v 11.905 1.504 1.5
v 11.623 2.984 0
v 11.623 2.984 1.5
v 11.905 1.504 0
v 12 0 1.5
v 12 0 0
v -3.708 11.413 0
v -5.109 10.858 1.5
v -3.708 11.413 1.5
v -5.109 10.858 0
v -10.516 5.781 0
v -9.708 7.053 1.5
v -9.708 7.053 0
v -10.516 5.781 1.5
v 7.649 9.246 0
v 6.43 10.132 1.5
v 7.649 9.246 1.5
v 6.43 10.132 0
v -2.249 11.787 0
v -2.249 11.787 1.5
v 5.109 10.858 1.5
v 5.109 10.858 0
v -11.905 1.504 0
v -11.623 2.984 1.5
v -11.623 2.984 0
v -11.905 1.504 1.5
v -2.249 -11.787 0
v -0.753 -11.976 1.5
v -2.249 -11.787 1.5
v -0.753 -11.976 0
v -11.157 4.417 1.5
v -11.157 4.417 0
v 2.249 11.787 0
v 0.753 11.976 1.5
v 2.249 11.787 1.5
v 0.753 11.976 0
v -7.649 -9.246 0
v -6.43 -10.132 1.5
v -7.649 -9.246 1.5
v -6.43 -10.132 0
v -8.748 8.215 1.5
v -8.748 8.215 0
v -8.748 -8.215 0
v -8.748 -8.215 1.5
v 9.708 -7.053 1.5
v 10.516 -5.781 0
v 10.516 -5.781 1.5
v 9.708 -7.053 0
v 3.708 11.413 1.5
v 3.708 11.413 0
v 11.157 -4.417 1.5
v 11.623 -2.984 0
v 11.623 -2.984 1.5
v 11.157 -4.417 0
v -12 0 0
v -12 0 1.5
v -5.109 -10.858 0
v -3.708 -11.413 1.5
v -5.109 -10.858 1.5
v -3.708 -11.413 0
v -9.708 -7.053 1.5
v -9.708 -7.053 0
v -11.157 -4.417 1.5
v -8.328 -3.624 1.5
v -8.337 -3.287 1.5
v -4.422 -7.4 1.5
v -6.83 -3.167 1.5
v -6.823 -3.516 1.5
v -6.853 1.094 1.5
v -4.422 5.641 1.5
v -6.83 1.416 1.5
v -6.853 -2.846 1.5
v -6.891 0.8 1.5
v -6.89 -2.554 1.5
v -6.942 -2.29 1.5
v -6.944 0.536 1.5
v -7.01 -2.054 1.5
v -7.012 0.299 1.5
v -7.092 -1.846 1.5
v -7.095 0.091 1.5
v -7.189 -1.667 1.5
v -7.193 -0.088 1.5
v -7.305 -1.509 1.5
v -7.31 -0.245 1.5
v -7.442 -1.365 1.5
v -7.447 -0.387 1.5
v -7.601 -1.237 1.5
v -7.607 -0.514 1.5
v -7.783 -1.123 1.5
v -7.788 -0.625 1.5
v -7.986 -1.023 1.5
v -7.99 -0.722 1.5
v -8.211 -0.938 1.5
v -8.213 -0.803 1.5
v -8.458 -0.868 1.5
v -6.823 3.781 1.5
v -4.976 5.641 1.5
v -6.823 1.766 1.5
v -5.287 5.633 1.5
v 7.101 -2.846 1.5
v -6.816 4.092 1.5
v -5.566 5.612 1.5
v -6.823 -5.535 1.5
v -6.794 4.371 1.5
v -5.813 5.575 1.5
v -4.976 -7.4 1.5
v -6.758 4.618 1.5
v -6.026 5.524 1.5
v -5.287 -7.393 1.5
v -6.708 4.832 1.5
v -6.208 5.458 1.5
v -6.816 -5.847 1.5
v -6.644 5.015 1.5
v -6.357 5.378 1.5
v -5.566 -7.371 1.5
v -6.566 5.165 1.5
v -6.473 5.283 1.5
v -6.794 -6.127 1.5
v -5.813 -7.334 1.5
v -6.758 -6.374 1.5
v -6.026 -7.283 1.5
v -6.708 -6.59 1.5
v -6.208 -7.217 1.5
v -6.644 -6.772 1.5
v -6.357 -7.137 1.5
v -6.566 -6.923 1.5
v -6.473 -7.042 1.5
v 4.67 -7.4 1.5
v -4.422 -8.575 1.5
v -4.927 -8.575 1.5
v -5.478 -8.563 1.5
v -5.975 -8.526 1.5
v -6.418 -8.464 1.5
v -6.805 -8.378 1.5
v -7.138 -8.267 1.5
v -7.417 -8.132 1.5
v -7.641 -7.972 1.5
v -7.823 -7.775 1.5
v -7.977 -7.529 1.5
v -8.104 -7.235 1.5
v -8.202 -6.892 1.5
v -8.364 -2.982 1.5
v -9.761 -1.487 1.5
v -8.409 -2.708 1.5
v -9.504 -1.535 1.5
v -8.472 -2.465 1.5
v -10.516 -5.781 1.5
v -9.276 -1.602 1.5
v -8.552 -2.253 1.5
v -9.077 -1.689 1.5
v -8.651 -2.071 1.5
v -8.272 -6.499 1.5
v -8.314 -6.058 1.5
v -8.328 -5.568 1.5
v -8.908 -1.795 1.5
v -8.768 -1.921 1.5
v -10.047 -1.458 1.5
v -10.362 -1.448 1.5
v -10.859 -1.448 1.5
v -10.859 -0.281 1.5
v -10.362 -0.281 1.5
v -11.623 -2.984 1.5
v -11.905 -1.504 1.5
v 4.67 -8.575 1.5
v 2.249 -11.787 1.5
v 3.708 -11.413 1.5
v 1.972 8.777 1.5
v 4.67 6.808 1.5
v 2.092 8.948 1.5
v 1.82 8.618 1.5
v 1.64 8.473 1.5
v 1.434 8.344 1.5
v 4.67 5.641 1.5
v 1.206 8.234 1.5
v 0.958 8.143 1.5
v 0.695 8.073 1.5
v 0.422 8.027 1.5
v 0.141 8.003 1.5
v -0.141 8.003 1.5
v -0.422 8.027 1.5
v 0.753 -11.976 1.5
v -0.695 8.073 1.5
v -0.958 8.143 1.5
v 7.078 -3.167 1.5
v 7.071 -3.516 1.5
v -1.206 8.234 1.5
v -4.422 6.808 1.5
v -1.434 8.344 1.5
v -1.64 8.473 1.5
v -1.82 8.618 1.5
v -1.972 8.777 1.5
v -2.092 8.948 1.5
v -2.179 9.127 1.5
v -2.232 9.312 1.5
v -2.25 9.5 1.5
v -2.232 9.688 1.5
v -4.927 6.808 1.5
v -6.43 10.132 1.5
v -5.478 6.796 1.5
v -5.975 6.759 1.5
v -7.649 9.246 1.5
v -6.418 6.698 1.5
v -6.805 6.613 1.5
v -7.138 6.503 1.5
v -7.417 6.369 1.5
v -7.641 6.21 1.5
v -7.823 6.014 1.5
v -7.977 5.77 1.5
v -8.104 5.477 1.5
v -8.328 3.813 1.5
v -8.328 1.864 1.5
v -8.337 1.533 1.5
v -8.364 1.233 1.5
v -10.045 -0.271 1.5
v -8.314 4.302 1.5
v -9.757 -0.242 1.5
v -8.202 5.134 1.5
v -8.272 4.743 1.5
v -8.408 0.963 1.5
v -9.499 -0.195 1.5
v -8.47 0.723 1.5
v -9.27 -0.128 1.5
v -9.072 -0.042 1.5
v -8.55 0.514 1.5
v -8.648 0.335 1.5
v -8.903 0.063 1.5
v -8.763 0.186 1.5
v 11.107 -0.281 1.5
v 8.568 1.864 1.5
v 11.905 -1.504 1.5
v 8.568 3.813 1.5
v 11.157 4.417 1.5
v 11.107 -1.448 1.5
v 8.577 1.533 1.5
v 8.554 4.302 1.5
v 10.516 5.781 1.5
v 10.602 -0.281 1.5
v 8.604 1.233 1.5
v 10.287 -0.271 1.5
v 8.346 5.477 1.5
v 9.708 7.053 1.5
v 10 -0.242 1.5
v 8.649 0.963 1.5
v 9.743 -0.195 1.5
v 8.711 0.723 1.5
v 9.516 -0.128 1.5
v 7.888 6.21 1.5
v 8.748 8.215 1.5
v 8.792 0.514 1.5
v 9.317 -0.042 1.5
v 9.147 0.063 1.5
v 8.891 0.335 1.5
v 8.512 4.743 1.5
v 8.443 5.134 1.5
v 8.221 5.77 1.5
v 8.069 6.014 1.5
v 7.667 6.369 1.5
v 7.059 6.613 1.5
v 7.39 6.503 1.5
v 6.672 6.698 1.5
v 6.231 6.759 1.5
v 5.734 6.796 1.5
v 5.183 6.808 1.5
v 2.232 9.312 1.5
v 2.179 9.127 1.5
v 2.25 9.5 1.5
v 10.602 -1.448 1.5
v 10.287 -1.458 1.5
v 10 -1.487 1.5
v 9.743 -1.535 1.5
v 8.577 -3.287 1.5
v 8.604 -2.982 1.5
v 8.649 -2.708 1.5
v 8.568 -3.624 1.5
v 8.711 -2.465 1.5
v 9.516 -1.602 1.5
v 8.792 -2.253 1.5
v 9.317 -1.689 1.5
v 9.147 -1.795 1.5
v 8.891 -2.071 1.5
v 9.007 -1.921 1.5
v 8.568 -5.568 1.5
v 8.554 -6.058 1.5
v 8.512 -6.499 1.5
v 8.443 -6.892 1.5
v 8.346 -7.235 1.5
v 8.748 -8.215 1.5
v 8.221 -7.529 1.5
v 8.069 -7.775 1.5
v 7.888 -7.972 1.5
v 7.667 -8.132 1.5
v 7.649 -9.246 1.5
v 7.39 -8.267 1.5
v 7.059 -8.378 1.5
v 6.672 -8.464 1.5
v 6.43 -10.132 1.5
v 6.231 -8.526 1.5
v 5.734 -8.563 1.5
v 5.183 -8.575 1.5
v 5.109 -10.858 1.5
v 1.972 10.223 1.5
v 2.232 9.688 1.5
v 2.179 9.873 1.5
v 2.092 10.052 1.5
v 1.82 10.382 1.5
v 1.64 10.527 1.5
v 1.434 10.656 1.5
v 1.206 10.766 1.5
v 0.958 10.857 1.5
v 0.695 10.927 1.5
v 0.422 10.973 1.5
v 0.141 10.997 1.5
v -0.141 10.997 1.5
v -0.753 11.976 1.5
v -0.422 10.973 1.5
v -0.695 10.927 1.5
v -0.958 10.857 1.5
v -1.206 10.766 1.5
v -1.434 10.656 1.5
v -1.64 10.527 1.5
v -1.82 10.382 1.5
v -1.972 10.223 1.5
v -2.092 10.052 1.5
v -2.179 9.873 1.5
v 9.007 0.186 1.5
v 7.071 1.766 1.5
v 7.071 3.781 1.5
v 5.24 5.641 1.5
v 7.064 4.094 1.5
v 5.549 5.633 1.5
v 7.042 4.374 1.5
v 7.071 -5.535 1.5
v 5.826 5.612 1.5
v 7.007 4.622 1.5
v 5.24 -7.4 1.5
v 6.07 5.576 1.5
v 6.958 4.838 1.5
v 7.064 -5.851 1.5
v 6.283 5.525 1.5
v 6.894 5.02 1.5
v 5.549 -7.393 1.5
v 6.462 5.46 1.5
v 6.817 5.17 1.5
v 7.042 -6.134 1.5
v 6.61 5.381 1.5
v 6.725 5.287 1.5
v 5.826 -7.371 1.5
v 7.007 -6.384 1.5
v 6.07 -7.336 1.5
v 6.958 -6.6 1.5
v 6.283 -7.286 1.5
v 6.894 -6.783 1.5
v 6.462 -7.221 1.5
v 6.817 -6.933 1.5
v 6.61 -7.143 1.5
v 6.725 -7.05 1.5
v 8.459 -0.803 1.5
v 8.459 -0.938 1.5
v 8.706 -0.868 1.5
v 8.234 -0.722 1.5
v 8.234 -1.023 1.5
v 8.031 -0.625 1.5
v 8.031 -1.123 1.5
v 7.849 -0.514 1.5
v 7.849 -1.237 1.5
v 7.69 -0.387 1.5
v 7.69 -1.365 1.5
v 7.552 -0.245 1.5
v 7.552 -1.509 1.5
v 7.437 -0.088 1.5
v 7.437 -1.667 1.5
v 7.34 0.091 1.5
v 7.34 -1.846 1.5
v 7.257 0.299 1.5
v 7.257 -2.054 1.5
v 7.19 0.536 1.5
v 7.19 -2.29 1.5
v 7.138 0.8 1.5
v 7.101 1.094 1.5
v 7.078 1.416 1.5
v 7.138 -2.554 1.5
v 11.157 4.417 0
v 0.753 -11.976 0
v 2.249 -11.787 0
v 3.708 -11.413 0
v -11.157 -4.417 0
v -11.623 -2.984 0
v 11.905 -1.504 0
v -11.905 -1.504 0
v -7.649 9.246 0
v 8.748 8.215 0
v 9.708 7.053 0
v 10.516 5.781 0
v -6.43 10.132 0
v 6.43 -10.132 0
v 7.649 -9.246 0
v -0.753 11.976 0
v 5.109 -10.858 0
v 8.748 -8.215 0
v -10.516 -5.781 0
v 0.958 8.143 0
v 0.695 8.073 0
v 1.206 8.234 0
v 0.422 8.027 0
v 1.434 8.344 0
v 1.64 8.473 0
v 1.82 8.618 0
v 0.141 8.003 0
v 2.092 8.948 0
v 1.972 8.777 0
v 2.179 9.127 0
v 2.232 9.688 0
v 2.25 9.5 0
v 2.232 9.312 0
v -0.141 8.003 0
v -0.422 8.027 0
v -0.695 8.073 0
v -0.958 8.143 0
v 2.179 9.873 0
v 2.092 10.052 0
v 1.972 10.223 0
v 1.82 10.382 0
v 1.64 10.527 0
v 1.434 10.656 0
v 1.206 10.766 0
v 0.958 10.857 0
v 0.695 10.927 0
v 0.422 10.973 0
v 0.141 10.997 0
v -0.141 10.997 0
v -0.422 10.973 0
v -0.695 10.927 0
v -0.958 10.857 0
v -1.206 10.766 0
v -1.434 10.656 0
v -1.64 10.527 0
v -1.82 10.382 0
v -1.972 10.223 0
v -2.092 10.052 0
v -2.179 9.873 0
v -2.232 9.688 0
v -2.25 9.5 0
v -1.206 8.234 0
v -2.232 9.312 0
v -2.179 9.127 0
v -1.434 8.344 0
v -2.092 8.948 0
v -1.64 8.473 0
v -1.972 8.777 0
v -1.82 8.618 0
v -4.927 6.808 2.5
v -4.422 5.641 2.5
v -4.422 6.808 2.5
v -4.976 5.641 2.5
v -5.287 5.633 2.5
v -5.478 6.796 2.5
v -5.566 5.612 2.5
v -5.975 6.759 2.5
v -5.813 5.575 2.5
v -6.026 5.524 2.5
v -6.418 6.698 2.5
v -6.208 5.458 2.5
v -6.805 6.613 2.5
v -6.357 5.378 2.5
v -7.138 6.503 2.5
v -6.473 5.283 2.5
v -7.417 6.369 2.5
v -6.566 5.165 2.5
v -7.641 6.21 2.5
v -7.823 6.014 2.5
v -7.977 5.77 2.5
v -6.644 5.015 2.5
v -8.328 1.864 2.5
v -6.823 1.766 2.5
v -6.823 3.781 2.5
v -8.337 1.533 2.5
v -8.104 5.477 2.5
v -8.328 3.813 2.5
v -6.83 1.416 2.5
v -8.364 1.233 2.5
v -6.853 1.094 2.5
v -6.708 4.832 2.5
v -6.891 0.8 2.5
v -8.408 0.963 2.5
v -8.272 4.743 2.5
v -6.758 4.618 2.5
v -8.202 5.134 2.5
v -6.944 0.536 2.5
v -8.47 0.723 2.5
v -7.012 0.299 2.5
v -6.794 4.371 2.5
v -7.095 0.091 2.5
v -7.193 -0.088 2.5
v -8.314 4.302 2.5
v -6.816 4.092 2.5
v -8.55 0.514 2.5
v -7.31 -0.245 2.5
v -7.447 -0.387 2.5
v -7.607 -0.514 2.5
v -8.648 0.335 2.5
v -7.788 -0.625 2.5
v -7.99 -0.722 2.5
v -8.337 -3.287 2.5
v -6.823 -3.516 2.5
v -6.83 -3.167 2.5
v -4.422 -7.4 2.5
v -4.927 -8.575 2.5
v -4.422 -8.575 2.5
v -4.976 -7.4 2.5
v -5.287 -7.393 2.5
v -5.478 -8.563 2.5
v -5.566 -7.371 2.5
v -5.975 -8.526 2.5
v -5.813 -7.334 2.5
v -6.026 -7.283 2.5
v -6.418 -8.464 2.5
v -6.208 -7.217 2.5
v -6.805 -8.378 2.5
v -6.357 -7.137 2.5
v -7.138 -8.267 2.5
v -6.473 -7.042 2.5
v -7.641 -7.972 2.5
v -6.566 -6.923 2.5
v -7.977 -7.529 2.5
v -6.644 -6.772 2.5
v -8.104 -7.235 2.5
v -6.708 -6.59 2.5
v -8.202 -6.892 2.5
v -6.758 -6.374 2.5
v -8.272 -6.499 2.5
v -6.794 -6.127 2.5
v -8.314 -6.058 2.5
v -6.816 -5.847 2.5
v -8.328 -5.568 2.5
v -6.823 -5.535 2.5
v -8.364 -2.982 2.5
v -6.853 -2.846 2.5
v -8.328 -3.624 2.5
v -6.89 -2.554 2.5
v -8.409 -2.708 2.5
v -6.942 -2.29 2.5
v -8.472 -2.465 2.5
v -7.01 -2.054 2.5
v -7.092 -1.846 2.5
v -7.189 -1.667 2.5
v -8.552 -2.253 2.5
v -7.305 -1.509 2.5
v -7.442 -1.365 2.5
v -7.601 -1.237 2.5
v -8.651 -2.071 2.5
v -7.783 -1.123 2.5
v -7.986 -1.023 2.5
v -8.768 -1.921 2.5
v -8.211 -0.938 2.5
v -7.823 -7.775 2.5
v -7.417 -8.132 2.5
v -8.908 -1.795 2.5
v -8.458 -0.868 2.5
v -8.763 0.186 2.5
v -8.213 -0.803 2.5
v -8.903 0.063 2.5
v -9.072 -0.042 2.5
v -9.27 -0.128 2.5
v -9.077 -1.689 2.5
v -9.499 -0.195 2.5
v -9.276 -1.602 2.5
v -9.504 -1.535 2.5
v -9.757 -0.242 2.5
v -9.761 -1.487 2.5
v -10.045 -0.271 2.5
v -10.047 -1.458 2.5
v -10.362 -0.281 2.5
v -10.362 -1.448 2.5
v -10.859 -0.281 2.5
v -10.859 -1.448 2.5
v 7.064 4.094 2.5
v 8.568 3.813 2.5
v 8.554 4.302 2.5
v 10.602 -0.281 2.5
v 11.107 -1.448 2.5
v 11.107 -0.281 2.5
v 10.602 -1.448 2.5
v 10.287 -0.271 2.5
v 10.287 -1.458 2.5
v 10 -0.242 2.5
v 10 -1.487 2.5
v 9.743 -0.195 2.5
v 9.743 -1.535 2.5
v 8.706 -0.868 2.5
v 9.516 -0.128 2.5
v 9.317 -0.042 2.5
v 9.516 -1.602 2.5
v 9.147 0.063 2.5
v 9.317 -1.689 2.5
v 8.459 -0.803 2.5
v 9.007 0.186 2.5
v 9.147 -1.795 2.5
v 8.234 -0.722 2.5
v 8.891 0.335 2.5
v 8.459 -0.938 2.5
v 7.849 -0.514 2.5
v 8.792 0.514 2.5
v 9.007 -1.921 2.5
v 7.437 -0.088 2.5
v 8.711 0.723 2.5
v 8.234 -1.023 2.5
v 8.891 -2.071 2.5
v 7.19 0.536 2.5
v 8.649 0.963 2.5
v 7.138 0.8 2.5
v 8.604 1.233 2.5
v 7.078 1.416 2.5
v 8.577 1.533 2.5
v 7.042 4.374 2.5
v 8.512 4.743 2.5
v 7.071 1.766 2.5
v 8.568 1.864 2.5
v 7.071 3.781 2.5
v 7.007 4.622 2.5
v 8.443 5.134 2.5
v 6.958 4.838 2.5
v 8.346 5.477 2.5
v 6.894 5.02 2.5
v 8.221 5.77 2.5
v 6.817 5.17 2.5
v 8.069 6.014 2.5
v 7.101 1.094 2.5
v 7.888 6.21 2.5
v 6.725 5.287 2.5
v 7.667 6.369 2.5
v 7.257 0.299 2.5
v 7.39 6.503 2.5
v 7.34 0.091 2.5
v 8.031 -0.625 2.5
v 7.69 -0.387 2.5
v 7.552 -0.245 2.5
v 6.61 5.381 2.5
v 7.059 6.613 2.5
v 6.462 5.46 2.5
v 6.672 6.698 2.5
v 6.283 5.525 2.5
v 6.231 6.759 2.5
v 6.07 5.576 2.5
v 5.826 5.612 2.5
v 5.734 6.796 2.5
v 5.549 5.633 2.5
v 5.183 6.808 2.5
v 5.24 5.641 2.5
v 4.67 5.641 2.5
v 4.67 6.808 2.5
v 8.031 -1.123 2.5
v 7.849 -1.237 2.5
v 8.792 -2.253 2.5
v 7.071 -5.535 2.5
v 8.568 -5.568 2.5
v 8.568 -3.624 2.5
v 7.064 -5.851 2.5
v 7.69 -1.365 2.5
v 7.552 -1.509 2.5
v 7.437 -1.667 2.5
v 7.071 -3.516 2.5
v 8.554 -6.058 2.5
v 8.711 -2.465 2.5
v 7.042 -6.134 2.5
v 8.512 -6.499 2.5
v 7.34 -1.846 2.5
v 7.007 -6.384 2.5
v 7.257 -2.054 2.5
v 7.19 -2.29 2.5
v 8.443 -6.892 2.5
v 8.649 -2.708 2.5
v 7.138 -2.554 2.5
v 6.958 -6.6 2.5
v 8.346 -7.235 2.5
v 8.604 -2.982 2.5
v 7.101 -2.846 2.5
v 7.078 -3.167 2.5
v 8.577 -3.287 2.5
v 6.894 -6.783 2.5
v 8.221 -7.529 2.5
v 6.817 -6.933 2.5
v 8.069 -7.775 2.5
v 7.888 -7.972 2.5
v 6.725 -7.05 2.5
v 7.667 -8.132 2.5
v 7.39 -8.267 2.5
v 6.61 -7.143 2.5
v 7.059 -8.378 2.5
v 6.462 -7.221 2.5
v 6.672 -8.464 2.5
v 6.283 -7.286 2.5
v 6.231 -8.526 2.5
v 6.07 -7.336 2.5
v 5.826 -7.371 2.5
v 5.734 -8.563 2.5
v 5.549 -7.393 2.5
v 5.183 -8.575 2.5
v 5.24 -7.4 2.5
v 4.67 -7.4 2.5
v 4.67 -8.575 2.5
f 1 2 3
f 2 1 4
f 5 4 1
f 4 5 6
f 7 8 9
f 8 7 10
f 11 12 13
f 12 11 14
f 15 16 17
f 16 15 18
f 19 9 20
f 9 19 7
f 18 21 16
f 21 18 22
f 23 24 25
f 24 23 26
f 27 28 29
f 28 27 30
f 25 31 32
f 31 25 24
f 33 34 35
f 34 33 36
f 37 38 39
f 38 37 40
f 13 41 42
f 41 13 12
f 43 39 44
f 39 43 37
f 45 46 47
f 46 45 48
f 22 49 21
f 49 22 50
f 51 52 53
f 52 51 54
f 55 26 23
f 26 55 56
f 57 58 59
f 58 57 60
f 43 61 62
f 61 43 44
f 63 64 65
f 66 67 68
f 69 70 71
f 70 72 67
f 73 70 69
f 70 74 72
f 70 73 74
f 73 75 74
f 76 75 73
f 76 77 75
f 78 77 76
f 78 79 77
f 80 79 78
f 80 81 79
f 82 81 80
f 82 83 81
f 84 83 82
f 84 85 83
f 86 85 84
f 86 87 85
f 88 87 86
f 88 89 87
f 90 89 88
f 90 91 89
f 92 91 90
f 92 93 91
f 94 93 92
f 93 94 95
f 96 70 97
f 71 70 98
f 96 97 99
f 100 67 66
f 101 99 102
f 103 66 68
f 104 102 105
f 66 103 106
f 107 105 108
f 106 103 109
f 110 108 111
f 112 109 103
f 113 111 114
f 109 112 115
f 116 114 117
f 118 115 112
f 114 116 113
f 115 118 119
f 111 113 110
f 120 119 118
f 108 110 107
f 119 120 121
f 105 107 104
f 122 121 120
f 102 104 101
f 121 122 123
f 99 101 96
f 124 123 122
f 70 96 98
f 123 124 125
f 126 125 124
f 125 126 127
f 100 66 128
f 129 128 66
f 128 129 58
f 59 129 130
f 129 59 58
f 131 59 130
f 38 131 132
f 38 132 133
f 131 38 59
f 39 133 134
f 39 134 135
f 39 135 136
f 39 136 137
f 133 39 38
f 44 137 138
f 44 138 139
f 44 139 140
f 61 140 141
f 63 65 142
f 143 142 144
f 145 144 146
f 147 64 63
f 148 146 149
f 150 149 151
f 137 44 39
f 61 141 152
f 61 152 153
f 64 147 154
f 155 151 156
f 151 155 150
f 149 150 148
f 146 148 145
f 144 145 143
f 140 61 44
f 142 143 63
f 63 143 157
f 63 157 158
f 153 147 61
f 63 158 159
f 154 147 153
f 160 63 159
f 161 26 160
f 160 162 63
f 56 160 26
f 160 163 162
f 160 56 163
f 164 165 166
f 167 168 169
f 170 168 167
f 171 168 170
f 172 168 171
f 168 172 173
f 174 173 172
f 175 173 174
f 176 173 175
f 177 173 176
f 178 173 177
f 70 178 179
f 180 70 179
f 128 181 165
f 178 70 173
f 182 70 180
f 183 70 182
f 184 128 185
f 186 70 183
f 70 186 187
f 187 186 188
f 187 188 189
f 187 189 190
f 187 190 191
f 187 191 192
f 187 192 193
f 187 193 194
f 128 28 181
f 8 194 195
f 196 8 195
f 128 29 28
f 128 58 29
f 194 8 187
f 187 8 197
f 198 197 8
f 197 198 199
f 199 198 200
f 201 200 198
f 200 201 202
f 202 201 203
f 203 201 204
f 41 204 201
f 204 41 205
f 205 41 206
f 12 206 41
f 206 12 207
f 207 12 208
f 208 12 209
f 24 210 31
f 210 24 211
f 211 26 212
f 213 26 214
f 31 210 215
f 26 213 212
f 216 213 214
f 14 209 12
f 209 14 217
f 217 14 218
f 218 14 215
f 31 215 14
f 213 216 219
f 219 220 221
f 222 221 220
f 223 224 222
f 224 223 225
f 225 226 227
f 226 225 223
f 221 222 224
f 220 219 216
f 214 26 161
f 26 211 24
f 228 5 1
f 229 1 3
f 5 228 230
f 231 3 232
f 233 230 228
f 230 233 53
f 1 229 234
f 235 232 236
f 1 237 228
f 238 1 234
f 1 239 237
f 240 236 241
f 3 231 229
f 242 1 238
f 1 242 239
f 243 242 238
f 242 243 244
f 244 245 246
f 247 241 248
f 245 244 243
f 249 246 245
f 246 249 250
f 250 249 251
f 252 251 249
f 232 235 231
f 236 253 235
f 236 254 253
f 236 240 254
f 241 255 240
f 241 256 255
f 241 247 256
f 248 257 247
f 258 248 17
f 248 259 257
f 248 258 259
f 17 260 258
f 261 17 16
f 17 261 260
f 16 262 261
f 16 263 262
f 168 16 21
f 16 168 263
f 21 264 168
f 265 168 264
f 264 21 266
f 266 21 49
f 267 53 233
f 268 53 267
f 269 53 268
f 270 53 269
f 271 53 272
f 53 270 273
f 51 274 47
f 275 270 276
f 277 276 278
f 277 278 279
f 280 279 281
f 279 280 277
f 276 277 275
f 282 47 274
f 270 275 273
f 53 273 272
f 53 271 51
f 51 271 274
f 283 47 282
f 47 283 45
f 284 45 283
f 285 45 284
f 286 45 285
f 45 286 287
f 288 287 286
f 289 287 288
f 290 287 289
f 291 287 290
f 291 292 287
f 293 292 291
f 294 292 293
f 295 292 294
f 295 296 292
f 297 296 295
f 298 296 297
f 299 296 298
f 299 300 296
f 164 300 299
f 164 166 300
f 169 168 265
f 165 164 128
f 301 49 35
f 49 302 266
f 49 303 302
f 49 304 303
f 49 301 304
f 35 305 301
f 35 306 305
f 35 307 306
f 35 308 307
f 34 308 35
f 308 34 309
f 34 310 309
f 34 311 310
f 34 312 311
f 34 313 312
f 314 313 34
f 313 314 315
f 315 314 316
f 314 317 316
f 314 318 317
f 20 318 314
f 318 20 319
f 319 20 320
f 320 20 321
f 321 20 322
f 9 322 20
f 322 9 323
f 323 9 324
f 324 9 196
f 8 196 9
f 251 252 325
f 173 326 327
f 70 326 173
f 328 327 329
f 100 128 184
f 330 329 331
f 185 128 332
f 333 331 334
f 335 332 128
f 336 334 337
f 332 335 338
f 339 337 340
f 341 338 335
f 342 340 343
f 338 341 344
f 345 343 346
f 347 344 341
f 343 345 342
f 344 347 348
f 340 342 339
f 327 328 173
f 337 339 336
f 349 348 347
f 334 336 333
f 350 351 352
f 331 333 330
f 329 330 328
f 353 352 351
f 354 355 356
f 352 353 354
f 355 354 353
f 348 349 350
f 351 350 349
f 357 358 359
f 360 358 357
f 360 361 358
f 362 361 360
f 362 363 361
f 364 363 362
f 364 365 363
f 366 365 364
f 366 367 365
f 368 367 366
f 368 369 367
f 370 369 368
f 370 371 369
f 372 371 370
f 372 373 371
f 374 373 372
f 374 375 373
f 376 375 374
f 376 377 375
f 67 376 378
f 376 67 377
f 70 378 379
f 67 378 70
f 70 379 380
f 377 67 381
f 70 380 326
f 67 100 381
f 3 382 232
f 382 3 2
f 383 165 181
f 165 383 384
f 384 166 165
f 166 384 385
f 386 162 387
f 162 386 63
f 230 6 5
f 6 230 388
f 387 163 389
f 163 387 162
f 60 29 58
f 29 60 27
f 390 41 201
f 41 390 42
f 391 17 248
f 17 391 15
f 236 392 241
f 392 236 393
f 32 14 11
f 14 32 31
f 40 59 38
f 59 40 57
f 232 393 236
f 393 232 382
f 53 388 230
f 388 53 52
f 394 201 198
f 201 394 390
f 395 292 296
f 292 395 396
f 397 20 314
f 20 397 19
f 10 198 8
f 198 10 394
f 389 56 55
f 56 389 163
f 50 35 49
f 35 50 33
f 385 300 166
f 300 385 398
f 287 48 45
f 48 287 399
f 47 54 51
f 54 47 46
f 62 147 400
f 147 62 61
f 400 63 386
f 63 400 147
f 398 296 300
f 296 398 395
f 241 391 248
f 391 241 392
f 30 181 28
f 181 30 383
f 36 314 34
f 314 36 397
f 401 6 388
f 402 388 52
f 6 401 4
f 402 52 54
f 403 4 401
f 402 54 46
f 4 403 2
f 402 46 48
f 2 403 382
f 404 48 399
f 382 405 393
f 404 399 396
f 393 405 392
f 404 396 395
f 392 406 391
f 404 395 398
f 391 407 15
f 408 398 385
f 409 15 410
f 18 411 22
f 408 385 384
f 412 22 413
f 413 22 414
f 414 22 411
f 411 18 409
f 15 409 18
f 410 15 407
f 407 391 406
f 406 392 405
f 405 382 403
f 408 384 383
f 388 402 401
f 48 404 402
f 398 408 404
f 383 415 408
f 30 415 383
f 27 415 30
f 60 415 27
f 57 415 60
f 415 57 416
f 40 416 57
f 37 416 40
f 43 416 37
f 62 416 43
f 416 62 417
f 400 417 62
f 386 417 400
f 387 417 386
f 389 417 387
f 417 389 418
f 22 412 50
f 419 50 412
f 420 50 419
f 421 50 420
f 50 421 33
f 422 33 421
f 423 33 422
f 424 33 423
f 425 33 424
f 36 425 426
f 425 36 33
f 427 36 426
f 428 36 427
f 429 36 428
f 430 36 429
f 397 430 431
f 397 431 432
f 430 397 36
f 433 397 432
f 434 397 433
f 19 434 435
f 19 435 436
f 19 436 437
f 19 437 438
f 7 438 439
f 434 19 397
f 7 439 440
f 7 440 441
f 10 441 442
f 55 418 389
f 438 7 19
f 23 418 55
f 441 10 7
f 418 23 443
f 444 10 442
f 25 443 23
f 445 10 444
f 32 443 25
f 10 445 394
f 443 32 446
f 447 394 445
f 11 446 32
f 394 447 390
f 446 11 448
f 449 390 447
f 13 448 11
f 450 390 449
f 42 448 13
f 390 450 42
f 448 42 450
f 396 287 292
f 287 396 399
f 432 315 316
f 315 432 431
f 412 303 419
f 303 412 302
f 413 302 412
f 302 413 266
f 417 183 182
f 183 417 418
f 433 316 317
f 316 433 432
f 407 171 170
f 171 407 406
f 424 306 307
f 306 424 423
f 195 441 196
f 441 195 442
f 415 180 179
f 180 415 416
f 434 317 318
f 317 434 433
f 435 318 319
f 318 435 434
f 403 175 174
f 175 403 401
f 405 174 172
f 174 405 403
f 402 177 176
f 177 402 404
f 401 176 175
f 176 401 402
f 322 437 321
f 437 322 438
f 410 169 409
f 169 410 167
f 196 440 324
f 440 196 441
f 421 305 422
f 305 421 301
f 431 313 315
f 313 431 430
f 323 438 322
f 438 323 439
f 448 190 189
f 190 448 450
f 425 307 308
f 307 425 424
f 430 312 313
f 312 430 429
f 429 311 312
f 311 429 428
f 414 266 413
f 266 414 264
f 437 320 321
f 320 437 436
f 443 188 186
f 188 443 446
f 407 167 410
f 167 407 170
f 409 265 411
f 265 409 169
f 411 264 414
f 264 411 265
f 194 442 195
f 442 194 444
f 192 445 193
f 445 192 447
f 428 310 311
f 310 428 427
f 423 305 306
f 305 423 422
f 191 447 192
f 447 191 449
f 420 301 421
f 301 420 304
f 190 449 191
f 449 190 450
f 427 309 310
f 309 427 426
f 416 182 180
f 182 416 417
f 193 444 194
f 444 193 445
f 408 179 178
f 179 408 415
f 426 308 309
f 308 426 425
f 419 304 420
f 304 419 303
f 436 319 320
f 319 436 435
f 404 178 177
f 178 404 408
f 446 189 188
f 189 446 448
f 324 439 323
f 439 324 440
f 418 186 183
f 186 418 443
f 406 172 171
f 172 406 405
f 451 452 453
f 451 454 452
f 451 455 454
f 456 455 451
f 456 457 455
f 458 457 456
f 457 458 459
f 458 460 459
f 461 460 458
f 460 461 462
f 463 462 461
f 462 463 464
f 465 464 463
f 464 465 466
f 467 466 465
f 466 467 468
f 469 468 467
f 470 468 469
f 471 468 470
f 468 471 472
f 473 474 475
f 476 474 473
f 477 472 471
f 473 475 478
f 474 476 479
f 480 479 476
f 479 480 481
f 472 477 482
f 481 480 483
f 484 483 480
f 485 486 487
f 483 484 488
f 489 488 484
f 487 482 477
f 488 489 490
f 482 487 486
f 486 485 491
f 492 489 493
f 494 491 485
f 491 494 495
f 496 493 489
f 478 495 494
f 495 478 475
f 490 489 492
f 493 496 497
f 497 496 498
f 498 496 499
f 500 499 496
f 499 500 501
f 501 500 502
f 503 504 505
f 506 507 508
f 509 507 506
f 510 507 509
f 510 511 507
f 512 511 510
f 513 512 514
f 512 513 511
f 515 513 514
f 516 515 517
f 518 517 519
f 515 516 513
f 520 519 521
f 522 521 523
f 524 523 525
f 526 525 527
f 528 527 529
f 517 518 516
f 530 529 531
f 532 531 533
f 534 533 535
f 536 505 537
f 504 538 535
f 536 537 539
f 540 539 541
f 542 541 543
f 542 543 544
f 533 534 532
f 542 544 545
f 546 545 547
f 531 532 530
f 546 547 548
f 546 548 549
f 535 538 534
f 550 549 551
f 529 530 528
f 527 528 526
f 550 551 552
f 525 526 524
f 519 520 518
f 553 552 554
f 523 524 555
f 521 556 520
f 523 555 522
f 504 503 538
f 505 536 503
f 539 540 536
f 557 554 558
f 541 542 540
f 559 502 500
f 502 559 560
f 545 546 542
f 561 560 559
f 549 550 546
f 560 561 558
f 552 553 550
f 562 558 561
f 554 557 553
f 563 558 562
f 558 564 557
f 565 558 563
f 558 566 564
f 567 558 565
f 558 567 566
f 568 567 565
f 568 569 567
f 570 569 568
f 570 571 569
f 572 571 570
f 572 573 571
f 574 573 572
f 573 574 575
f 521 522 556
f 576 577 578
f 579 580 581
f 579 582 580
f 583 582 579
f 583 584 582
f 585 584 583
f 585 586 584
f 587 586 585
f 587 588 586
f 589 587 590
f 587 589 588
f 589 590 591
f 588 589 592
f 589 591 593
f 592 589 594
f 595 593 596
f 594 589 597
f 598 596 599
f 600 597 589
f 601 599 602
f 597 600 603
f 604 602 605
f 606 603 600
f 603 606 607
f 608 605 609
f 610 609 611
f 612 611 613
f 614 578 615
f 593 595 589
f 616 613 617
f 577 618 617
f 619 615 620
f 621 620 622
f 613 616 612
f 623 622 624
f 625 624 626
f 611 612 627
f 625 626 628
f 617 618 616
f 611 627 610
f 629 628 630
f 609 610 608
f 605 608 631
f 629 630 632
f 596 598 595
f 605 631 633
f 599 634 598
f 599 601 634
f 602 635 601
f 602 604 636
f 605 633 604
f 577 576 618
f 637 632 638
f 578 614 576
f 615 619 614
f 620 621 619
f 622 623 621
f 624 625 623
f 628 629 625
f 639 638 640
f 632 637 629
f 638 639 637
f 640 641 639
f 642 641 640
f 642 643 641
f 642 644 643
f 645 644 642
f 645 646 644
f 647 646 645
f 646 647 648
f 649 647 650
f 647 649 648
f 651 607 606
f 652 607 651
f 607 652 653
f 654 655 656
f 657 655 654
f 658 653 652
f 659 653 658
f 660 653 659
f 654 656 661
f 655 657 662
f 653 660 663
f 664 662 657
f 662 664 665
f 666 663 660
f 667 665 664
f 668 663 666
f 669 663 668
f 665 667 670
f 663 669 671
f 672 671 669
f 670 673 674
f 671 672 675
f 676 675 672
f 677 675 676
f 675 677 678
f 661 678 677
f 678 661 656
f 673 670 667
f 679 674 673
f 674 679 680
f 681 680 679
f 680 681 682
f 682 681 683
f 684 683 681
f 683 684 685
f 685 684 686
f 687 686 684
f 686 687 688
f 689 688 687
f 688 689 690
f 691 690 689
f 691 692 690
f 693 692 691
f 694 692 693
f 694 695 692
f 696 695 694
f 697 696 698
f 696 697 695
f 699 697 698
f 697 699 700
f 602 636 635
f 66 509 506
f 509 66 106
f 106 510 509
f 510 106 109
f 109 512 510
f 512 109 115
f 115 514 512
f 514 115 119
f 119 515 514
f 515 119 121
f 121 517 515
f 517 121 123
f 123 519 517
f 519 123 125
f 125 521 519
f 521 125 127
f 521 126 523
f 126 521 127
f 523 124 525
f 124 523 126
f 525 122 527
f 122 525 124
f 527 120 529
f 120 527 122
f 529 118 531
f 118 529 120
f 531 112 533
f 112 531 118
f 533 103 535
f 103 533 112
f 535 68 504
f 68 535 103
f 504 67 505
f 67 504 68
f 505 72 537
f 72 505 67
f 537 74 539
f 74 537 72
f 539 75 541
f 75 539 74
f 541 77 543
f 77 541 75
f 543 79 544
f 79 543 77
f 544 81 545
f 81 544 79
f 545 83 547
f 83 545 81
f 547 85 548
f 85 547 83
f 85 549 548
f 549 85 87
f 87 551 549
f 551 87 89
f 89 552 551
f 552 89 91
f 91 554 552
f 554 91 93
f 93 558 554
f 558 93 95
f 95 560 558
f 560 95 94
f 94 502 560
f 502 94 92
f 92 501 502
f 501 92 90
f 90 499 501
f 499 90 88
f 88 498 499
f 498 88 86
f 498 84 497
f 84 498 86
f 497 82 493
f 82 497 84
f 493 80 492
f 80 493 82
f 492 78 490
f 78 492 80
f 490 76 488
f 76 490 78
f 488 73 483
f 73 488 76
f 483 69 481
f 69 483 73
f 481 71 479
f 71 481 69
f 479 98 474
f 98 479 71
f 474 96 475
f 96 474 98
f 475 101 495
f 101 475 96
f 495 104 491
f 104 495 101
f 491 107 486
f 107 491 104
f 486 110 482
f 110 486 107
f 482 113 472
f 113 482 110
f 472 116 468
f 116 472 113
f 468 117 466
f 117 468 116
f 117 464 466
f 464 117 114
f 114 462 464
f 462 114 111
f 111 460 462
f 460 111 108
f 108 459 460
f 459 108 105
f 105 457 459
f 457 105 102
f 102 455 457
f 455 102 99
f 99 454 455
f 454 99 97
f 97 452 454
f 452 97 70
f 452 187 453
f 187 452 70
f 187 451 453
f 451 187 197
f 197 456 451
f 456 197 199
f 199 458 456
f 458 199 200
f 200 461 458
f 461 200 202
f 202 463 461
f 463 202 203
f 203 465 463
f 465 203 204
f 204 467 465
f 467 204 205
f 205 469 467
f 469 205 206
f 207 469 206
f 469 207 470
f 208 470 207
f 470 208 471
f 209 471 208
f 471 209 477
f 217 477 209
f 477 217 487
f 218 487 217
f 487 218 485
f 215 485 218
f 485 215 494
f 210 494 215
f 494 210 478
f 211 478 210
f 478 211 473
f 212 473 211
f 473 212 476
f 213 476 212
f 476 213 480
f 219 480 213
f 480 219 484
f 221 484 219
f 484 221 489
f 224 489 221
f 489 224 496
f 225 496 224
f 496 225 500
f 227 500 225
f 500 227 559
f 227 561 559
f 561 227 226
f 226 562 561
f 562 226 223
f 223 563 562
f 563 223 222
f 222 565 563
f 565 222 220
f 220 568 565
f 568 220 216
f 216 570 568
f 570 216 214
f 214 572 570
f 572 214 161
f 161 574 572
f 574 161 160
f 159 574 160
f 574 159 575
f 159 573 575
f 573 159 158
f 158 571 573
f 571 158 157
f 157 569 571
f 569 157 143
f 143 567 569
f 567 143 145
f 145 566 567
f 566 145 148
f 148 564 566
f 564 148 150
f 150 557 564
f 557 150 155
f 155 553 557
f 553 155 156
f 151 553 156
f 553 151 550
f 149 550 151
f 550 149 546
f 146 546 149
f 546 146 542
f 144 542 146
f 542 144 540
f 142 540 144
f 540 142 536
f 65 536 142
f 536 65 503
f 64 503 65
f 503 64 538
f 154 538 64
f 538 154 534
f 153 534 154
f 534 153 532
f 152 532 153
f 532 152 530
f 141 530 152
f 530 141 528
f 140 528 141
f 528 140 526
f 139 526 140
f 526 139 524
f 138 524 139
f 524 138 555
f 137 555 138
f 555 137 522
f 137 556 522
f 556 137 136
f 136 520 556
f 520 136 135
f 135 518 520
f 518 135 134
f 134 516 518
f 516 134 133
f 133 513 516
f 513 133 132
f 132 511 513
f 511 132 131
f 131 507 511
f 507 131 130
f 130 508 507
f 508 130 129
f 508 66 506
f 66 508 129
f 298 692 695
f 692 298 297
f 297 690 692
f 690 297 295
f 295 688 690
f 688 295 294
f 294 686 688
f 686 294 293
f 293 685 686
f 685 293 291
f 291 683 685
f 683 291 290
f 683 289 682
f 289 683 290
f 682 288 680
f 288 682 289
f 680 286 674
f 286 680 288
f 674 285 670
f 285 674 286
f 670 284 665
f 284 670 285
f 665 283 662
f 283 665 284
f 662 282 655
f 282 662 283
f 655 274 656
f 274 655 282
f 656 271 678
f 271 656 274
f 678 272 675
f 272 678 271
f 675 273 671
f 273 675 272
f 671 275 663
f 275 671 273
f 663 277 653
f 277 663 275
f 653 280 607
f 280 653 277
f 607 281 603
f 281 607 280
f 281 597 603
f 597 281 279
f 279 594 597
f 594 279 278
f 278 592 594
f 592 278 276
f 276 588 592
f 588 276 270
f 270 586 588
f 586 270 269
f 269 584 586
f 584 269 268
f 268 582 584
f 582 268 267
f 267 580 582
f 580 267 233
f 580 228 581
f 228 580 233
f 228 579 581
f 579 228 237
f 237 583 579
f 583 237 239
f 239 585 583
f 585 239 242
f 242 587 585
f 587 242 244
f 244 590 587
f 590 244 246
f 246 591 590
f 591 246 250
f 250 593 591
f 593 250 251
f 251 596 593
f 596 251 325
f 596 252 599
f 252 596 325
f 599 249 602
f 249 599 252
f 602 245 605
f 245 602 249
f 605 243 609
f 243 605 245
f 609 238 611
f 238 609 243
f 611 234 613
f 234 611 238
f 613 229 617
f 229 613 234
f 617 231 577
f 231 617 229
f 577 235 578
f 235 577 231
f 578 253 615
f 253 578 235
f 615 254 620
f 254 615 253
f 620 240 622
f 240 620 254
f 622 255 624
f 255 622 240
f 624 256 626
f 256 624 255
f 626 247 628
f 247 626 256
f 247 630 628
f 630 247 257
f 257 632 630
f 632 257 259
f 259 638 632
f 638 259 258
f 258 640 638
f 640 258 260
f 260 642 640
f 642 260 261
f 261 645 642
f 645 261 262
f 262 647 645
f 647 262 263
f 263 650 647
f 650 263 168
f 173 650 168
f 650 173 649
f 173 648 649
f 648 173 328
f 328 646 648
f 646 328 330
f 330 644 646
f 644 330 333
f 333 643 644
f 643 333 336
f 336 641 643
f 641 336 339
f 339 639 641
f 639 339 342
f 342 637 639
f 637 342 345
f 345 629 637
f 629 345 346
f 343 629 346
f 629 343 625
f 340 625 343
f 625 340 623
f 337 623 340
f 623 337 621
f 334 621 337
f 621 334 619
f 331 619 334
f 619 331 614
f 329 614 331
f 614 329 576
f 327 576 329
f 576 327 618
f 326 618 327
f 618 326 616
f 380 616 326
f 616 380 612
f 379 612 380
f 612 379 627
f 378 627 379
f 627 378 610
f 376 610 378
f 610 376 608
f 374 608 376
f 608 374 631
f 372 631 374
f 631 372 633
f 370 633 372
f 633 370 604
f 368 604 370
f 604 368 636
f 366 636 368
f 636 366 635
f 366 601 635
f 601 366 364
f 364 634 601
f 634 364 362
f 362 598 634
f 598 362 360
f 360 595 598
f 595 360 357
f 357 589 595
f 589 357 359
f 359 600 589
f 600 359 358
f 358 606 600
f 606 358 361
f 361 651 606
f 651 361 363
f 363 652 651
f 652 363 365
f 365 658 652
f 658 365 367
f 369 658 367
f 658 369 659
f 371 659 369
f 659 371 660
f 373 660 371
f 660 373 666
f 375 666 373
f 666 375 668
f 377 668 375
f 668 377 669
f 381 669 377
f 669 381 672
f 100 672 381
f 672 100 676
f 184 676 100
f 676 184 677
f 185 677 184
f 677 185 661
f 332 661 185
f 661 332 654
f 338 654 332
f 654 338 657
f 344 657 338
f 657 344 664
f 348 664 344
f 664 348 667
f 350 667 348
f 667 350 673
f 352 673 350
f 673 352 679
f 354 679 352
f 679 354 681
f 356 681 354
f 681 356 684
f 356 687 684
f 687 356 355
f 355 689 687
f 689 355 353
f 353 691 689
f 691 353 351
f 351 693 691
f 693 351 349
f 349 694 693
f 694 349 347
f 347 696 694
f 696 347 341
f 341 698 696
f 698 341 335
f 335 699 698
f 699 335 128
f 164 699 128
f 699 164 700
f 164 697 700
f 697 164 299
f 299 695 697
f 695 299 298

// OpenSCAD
$fn = 50;

base_heigth = 1.5;

// Base
difference() {
	cylinder(r=12, h=base_heigth);
	translate([0, 9.5, 0]) scale([1.5, 1.0, 1.0]) cylinder(r=1.5, h=base_heigth);
}

// Text
translate([0, -1, base_heigth])
linear_extrude(height = 1) {
		#text("{ }", size = 12, font = "Impact", halign = "center", valign = "center");
}
